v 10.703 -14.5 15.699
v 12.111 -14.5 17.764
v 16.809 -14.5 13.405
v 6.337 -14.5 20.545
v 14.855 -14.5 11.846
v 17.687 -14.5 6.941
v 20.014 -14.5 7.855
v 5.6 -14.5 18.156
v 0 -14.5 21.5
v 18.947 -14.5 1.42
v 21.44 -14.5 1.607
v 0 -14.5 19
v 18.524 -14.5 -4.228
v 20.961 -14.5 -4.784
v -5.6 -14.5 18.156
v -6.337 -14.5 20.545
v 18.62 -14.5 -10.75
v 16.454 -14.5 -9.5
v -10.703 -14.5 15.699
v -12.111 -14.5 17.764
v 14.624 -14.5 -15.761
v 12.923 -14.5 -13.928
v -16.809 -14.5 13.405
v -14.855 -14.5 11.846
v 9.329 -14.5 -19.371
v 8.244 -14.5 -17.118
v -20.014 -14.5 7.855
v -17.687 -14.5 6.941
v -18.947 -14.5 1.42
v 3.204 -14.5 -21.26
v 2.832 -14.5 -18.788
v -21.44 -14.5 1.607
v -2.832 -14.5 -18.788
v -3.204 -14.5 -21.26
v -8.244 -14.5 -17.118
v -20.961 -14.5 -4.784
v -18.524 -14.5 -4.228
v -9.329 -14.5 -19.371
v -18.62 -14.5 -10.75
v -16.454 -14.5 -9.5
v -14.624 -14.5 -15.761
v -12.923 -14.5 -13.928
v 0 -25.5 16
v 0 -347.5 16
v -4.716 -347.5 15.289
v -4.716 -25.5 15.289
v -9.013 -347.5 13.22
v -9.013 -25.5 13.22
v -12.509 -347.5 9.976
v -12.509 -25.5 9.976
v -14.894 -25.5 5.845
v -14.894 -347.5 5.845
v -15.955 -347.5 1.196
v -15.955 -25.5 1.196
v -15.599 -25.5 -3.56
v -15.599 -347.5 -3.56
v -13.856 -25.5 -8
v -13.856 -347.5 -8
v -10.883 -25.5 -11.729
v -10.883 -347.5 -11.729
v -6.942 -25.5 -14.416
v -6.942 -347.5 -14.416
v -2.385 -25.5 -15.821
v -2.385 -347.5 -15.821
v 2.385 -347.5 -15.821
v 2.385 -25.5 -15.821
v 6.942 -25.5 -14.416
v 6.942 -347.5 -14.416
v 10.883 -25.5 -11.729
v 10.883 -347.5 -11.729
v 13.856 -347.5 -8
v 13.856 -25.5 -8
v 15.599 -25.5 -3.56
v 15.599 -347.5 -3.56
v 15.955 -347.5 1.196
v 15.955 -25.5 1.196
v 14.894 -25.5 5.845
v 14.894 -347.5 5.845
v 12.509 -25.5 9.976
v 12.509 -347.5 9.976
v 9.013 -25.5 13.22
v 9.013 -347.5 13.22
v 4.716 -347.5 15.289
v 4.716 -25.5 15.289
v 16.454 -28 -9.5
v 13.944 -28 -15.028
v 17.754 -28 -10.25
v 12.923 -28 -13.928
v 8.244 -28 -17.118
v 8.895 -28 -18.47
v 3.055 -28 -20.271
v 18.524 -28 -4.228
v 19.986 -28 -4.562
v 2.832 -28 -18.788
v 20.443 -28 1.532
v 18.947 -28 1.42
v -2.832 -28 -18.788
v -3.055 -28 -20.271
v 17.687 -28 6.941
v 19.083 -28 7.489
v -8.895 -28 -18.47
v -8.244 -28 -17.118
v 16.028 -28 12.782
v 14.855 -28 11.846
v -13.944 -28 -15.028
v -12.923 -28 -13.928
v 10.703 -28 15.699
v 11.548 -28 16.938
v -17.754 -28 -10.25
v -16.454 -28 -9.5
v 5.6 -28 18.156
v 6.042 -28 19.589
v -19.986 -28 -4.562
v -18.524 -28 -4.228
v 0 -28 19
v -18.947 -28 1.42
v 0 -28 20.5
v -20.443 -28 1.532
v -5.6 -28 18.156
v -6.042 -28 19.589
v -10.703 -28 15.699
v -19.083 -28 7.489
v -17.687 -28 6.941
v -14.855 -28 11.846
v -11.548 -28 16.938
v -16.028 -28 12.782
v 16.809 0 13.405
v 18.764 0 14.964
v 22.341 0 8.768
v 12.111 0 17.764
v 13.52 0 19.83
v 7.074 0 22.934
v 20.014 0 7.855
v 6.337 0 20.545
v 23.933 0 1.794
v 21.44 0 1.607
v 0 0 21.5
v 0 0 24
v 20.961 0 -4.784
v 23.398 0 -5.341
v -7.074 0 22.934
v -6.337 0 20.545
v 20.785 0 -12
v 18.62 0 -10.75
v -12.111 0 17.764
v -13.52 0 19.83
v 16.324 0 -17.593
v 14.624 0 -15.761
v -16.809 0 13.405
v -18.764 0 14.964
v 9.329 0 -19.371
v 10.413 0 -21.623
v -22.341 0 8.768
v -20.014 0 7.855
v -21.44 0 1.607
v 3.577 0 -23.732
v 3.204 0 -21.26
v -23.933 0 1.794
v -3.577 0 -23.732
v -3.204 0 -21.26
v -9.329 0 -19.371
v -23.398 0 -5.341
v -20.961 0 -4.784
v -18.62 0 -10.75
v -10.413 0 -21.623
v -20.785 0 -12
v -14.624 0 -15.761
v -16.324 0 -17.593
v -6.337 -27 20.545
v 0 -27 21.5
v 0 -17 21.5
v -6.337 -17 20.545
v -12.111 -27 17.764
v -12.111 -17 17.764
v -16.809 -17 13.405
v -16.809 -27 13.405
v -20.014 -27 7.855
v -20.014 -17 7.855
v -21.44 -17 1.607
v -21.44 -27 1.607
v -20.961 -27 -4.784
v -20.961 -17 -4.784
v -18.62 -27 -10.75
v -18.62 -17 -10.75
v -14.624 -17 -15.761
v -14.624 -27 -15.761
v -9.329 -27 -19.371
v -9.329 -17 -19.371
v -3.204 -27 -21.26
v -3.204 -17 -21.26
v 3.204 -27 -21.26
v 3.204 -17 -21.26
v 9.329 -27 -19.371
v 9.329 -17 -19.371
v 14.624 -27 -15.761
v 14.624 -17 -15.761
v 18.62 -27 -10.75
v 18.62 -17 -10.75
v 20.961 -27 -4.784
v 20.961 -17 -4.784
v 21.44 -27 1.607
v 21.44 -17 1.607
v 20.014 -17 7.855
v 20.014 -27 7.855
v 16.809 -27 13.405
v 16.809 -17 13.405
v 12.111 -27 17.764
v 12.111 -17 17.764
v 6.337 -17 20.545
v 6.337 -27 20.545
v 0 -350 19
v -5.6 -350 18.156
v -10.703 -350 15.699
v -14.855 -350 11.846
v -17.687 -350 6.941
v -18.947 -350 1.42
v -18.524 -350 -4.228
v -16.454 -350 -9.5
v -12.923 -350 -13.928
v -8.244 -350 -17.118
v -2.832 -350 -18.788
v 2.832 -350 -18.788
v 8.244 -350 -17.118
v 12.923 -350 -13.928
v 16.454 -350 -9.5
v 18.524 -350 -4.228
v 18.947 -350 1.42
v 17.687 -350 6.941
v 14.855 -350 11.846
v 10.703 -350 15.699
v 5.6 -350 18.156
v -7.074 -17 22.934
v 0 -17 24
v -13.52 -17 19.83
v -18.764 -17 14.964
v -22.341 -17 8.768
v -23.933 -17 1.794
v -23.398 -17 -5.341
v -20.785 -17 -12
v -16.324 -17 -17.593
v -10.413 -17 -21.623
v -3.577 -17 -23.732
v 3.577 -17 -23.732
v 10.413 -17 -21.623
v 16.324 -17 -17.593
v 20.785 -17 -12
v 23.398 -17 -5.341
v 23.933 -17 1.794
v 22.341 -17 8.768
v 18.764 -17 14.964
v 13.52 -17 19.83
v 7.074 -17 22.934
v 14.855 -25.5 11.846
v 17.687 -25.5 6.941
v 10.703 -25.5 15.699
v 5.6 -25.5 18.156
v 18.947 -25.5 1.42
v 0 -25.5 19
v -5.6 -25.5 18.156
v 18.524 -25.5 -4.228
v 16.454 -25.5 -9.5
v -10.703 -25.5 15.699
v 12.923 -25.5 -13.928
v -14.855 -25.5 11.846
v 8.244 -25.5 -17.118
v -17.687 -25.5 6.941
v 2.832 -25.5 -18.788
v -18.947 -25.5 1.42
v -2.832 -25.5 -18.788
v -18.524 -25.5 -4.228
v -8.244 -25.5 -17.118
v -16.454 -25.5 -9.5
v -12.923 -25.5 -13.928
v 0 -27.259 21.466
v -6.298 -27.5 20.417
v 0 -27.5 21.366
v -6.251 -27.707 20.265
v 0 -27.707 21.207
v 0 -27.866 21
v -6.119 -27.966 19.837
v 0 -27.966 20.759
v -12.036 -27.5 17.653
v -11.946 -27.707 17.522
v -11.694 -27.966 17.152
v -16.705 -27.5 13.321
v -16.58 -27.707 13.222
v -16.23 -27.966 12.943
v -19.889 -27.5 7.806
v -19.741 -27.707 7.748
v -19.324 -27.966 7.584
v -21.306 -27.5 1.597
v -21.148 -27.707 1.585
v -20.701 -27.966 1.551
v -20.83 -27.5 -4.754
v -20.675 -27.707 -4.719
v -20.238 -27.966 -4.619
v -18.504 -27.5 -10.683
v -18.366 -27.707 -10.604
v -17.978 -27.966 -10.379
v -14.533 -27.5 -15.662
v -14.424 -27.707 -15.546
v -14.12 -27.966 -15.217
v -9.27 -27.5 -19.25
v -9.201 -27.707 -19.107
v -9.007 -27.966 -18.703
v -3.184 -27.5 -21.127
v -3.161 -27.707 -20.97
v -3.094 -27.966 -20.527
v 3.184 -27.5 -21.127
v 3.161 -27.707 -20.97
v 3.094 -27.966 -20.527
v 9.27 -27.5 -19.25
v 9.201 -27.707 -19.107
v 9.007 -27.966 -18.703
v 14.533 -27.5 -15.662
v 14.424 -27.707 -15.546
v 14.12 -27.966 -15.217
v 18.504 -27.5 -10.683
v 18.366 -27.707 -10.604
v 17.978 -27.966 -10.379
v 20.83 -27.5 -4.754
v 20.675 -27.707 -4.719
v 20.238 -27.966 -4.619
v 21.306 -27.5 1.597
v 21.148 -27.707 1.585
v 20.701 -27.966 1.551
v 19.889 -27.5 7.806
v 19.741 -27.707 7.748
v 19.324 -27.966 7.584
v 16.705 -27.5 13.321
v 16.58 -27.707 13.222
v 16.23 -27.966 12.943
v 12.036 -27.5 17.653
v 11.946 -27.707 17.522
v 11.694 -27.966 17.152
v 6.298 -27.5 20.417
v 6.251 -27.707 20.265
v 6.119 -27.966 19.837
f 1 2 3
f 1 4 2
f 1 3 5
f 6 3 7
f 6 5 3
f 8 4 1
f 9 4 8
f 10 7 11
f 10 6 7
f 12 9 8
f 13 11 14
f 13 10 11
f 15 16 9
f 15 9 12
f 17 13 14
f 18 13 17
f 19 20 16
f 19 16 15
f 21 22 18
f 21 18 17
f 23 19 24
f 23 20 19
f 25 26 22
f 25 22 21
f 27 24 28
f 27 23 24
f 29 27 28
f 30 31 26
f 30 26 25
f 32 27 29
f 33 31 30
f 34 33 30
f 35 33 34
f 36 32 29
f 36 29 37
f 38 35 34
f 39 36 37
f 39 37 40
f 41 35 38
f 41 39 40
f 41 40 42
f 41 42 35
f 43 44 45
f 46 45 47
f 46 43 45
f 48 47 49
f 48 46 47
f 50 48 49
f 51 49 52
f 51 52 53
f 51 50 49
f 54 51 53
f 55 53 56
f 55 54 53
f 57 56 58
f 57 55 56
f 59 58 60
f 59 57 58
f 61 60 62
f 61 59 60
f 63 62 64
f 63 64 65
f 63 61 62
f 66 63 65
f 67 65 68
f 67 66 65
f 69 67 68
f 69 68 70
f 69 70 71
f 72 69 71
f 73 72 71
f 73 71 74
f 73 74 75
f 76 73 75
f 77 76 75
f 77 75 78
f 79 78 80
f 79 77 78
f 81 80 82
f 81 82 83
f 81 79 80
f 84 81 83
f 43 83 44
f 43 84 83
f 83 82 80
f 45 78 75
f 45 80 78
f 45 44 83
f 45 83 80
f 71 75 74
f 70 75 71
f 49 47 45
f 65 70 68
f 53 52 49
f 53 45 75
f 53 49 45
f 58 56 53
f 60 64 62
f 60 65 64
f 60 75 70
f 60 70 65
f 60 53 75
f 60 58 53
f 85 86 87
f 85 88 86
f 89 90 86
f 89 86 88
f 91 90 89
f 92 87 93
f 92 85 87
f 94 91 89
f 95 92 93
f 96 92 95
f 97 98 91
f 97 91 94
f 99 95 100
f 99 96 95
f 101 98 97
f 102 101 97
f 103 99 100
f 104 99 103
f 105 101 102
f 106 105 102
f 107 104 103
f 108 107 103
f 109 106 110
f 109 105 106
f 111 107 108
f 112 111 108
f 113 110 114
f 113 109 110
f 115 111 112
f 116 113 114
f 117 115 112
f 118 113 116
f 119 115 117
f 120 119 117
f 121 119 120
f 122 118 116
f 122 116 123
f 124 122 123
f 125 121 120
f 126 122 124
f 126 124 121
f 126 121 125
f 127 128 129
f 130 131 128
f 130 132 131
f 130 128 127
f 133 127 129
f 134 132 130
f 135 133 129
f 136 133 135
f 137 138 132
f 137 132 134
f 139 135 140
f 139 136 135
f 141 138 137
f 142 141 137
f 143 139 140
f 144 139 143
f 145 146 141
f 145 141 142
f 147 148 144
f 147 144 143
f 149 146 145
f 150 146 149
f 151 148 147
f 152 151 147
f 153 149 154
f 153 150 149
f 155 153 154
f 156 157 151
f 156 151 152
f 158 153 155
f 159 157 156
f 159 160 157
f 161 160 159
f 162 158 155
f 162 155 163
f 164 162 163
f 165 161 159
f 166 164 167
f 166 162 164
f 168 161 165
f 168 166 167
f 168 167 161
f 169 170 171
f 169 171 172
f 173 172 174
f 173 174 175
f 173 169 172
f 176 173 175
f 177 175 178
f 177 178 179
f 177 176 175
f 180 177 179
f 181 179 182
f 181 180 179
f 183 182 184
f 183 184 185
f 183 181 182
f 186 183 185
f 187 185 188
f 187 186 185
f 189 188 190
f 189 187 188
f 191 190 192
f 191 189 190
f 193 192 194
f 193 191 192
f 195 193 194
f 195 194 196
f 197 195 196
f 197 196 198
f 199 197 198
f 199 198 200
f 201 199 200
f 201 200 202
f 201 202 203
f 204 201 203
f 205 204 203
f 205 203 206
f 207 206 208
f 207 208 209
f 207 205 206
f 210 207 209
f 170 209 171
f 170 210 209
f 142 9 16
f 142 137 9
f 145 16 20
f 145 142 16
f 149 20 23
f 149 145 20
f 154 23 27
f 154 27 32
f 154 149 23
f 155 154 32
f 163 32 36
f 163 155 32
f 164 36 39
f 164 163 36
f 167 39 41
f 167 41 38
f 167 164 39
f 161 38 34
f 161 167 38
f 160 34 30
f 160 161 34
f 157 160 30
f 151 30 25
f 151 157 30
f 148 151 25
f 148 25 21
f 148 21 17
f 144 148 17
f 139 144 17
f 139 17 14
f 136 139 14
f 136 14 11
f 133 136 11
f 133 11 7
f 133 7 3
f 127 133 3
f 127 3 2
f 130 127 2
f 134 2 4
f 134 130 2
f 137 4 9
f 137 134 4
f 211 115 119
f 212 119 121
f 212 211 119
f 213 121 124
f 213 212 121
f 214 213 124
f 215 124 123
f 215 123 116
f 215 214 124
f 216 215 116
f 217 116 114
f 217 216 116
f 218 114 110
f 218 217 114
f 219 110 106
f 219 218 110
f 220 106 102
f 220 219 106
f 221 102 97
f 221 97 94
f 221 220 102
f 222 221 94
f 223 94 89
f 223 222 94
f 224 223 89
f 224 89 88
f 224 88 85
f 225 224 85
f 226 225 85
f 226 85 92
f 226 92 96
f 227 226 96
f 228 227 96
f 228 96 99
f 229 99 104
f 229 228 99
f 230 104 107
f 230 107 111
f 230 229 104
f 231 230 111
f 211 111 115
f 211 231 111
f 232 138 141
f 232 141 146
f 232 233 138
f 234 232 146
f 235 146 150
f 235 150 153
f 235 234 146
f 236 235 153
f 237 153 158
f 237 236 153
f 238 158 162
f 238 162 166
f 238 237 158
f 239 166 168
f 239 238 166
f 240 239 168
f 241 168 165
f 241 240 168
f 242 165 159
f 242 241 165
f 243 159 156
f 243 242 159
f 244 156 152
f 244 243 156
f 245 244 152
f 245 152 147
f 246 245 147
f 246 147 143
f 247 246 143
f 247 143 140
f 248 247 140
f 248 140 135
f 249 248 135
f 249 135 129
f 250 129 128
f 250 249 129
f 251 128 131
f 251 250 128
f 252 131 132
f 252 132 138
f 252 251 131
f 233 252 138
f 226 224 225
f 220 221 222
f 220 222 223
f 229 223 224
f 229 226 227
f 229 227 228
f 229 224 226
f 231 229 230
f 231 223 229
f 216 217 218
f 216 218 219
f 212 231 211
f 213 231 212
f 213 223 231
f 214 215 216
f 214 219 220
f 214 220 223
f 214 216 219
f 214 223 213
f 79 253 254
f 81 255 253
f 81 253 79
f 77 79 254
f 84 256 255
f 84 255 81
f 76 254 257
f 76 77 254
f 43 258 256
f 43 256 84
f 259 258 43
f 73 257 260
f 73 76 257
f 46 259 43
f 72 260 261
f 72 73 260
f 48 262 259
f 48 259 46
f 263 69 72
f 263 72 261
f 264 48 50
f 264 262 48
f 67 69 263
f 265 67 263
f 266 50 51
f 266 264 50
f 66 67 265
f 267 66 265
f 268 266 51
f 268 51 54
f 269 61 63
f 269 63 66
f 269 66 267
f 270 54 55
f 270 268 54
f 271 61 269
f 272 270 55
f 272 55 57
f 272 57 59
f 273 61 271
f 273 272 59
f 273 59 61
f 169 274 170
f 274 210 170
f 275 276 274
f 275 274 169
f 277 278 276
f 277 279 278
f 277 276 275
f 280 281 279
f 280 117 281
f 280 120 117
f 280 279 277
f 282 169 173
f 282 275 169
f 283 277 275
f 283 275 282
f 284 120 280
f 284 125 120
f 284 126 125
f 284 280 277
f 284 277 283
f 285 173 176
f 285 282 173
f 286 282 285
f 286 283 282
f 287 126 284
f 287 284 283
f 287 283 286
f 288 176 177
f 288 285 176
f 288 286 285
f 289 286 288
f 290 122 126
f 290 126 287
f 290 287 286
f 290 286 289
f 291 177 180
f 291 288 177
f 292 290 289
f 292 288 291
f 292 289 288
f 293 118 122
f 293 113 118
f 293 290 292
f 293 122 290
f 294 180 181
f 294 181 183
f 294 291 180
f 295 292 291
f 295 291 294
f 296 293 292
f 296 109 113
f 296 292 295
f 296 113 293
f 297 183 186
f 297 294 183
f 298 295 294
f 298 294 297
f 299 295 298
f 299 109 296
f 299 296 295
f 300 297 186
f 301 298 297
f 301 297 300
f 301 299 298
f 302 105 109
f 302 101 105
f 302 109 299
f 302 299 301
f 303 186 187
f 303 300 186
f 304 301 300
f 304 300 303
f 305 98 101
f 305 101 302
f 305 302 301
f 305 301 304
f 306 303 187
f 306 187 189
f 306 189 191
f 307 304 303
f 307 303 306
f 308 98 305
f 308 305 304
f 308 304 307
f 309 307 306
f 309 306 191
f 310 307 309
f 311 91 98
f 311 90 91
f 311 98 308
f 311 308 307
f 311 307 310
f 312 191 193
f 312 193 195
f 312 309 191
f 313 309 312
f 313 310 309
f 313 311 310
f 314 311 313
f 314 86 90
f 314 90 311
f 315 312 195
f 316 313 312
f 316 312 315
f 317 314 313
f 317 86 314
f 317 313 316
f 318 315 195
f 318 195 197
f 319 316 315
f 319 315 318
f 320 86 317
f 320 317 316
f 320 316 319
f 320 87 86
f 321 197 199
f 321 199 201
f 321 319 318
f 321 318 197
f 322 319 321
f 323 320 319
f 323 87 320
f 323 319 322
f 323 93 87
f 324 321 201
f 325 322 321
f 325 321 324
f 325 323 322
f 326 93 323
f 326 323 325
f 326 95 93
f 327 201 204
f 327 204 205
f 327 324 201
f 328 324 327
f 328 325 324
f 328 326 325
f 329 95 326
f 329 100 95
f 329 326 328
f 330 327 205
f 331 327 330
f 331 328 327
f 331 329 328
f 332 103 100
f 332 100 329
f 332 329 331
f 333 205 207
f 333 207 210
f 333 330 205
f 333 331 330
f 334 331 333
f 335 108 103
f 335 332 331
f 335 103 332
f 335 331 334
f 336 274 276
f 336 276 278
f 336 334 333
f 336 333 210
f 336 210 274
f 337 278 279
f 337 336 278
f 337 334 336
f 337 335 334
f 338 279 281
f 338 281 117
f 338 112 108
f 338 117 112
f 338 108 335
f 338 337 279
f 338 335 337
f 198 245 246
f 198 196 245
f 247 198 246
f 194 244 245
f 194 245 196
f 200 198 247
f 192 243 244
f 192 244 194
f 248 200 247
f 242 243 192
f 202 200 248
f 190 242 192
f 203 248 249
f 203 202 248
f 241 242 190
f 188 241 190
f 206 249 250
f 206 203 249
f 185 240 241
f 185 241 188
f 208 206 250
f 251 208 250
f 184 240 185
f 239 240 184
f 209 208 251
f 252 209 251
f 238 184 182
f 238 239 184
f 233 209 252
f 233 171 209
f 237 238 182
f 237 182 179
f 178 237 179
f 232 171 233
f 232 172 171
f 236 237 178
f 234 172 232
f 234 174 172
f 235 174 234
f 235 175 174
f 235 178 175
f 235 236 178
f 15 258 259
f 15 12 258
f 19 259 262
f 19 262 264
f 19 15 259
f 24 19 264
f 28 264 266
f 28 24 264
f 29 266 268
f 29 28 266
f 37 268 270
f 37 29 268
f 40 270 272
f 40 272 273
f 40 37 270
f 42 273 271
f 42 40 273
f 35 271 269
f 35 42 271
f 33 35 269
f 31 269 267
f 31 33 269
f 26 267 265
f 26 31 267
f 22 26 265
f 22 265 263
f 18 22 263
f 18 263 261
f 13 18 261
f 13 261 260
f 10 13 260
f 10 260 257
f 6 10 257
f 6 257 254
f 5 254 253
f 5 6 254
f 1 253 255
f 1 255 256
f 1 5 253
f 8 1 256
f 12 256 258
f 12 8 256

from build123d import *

# Parameters (mm, degrees)
FILLET2_R = 1


with BuildPart() as part:
    # Sketch1 → Revolve1 (revolve)
    with BuildSketch(Plane(origin=(0, 0, 0), x_dir=(0, 0, -1), z_dir=(1, 0, 0))):
        Polygon((-21.5, 0), (-24, 0), (-24, -17), (-21.5, -17), (-21.5, -28), (-19, -28), (-19, -350), (0, -350), (0, -347.5), (-16, -347.5), (-16, -345.435797774), (-16, -25.5), (-19, -25.5), (-19, -14.5), (-21.5, -14.5), align=None)
    revolve(axis=Axis((0, 0, 0), (0, -1, 0)))

    # Fillet2
    fillet2_edges = [part.edges().sort_by_distance(p)[0] for p in [
        (0, -28, -21.5),
    ]]
    fillet(fillet2_edges, radius=FILLET2_R)


solid = part.part
